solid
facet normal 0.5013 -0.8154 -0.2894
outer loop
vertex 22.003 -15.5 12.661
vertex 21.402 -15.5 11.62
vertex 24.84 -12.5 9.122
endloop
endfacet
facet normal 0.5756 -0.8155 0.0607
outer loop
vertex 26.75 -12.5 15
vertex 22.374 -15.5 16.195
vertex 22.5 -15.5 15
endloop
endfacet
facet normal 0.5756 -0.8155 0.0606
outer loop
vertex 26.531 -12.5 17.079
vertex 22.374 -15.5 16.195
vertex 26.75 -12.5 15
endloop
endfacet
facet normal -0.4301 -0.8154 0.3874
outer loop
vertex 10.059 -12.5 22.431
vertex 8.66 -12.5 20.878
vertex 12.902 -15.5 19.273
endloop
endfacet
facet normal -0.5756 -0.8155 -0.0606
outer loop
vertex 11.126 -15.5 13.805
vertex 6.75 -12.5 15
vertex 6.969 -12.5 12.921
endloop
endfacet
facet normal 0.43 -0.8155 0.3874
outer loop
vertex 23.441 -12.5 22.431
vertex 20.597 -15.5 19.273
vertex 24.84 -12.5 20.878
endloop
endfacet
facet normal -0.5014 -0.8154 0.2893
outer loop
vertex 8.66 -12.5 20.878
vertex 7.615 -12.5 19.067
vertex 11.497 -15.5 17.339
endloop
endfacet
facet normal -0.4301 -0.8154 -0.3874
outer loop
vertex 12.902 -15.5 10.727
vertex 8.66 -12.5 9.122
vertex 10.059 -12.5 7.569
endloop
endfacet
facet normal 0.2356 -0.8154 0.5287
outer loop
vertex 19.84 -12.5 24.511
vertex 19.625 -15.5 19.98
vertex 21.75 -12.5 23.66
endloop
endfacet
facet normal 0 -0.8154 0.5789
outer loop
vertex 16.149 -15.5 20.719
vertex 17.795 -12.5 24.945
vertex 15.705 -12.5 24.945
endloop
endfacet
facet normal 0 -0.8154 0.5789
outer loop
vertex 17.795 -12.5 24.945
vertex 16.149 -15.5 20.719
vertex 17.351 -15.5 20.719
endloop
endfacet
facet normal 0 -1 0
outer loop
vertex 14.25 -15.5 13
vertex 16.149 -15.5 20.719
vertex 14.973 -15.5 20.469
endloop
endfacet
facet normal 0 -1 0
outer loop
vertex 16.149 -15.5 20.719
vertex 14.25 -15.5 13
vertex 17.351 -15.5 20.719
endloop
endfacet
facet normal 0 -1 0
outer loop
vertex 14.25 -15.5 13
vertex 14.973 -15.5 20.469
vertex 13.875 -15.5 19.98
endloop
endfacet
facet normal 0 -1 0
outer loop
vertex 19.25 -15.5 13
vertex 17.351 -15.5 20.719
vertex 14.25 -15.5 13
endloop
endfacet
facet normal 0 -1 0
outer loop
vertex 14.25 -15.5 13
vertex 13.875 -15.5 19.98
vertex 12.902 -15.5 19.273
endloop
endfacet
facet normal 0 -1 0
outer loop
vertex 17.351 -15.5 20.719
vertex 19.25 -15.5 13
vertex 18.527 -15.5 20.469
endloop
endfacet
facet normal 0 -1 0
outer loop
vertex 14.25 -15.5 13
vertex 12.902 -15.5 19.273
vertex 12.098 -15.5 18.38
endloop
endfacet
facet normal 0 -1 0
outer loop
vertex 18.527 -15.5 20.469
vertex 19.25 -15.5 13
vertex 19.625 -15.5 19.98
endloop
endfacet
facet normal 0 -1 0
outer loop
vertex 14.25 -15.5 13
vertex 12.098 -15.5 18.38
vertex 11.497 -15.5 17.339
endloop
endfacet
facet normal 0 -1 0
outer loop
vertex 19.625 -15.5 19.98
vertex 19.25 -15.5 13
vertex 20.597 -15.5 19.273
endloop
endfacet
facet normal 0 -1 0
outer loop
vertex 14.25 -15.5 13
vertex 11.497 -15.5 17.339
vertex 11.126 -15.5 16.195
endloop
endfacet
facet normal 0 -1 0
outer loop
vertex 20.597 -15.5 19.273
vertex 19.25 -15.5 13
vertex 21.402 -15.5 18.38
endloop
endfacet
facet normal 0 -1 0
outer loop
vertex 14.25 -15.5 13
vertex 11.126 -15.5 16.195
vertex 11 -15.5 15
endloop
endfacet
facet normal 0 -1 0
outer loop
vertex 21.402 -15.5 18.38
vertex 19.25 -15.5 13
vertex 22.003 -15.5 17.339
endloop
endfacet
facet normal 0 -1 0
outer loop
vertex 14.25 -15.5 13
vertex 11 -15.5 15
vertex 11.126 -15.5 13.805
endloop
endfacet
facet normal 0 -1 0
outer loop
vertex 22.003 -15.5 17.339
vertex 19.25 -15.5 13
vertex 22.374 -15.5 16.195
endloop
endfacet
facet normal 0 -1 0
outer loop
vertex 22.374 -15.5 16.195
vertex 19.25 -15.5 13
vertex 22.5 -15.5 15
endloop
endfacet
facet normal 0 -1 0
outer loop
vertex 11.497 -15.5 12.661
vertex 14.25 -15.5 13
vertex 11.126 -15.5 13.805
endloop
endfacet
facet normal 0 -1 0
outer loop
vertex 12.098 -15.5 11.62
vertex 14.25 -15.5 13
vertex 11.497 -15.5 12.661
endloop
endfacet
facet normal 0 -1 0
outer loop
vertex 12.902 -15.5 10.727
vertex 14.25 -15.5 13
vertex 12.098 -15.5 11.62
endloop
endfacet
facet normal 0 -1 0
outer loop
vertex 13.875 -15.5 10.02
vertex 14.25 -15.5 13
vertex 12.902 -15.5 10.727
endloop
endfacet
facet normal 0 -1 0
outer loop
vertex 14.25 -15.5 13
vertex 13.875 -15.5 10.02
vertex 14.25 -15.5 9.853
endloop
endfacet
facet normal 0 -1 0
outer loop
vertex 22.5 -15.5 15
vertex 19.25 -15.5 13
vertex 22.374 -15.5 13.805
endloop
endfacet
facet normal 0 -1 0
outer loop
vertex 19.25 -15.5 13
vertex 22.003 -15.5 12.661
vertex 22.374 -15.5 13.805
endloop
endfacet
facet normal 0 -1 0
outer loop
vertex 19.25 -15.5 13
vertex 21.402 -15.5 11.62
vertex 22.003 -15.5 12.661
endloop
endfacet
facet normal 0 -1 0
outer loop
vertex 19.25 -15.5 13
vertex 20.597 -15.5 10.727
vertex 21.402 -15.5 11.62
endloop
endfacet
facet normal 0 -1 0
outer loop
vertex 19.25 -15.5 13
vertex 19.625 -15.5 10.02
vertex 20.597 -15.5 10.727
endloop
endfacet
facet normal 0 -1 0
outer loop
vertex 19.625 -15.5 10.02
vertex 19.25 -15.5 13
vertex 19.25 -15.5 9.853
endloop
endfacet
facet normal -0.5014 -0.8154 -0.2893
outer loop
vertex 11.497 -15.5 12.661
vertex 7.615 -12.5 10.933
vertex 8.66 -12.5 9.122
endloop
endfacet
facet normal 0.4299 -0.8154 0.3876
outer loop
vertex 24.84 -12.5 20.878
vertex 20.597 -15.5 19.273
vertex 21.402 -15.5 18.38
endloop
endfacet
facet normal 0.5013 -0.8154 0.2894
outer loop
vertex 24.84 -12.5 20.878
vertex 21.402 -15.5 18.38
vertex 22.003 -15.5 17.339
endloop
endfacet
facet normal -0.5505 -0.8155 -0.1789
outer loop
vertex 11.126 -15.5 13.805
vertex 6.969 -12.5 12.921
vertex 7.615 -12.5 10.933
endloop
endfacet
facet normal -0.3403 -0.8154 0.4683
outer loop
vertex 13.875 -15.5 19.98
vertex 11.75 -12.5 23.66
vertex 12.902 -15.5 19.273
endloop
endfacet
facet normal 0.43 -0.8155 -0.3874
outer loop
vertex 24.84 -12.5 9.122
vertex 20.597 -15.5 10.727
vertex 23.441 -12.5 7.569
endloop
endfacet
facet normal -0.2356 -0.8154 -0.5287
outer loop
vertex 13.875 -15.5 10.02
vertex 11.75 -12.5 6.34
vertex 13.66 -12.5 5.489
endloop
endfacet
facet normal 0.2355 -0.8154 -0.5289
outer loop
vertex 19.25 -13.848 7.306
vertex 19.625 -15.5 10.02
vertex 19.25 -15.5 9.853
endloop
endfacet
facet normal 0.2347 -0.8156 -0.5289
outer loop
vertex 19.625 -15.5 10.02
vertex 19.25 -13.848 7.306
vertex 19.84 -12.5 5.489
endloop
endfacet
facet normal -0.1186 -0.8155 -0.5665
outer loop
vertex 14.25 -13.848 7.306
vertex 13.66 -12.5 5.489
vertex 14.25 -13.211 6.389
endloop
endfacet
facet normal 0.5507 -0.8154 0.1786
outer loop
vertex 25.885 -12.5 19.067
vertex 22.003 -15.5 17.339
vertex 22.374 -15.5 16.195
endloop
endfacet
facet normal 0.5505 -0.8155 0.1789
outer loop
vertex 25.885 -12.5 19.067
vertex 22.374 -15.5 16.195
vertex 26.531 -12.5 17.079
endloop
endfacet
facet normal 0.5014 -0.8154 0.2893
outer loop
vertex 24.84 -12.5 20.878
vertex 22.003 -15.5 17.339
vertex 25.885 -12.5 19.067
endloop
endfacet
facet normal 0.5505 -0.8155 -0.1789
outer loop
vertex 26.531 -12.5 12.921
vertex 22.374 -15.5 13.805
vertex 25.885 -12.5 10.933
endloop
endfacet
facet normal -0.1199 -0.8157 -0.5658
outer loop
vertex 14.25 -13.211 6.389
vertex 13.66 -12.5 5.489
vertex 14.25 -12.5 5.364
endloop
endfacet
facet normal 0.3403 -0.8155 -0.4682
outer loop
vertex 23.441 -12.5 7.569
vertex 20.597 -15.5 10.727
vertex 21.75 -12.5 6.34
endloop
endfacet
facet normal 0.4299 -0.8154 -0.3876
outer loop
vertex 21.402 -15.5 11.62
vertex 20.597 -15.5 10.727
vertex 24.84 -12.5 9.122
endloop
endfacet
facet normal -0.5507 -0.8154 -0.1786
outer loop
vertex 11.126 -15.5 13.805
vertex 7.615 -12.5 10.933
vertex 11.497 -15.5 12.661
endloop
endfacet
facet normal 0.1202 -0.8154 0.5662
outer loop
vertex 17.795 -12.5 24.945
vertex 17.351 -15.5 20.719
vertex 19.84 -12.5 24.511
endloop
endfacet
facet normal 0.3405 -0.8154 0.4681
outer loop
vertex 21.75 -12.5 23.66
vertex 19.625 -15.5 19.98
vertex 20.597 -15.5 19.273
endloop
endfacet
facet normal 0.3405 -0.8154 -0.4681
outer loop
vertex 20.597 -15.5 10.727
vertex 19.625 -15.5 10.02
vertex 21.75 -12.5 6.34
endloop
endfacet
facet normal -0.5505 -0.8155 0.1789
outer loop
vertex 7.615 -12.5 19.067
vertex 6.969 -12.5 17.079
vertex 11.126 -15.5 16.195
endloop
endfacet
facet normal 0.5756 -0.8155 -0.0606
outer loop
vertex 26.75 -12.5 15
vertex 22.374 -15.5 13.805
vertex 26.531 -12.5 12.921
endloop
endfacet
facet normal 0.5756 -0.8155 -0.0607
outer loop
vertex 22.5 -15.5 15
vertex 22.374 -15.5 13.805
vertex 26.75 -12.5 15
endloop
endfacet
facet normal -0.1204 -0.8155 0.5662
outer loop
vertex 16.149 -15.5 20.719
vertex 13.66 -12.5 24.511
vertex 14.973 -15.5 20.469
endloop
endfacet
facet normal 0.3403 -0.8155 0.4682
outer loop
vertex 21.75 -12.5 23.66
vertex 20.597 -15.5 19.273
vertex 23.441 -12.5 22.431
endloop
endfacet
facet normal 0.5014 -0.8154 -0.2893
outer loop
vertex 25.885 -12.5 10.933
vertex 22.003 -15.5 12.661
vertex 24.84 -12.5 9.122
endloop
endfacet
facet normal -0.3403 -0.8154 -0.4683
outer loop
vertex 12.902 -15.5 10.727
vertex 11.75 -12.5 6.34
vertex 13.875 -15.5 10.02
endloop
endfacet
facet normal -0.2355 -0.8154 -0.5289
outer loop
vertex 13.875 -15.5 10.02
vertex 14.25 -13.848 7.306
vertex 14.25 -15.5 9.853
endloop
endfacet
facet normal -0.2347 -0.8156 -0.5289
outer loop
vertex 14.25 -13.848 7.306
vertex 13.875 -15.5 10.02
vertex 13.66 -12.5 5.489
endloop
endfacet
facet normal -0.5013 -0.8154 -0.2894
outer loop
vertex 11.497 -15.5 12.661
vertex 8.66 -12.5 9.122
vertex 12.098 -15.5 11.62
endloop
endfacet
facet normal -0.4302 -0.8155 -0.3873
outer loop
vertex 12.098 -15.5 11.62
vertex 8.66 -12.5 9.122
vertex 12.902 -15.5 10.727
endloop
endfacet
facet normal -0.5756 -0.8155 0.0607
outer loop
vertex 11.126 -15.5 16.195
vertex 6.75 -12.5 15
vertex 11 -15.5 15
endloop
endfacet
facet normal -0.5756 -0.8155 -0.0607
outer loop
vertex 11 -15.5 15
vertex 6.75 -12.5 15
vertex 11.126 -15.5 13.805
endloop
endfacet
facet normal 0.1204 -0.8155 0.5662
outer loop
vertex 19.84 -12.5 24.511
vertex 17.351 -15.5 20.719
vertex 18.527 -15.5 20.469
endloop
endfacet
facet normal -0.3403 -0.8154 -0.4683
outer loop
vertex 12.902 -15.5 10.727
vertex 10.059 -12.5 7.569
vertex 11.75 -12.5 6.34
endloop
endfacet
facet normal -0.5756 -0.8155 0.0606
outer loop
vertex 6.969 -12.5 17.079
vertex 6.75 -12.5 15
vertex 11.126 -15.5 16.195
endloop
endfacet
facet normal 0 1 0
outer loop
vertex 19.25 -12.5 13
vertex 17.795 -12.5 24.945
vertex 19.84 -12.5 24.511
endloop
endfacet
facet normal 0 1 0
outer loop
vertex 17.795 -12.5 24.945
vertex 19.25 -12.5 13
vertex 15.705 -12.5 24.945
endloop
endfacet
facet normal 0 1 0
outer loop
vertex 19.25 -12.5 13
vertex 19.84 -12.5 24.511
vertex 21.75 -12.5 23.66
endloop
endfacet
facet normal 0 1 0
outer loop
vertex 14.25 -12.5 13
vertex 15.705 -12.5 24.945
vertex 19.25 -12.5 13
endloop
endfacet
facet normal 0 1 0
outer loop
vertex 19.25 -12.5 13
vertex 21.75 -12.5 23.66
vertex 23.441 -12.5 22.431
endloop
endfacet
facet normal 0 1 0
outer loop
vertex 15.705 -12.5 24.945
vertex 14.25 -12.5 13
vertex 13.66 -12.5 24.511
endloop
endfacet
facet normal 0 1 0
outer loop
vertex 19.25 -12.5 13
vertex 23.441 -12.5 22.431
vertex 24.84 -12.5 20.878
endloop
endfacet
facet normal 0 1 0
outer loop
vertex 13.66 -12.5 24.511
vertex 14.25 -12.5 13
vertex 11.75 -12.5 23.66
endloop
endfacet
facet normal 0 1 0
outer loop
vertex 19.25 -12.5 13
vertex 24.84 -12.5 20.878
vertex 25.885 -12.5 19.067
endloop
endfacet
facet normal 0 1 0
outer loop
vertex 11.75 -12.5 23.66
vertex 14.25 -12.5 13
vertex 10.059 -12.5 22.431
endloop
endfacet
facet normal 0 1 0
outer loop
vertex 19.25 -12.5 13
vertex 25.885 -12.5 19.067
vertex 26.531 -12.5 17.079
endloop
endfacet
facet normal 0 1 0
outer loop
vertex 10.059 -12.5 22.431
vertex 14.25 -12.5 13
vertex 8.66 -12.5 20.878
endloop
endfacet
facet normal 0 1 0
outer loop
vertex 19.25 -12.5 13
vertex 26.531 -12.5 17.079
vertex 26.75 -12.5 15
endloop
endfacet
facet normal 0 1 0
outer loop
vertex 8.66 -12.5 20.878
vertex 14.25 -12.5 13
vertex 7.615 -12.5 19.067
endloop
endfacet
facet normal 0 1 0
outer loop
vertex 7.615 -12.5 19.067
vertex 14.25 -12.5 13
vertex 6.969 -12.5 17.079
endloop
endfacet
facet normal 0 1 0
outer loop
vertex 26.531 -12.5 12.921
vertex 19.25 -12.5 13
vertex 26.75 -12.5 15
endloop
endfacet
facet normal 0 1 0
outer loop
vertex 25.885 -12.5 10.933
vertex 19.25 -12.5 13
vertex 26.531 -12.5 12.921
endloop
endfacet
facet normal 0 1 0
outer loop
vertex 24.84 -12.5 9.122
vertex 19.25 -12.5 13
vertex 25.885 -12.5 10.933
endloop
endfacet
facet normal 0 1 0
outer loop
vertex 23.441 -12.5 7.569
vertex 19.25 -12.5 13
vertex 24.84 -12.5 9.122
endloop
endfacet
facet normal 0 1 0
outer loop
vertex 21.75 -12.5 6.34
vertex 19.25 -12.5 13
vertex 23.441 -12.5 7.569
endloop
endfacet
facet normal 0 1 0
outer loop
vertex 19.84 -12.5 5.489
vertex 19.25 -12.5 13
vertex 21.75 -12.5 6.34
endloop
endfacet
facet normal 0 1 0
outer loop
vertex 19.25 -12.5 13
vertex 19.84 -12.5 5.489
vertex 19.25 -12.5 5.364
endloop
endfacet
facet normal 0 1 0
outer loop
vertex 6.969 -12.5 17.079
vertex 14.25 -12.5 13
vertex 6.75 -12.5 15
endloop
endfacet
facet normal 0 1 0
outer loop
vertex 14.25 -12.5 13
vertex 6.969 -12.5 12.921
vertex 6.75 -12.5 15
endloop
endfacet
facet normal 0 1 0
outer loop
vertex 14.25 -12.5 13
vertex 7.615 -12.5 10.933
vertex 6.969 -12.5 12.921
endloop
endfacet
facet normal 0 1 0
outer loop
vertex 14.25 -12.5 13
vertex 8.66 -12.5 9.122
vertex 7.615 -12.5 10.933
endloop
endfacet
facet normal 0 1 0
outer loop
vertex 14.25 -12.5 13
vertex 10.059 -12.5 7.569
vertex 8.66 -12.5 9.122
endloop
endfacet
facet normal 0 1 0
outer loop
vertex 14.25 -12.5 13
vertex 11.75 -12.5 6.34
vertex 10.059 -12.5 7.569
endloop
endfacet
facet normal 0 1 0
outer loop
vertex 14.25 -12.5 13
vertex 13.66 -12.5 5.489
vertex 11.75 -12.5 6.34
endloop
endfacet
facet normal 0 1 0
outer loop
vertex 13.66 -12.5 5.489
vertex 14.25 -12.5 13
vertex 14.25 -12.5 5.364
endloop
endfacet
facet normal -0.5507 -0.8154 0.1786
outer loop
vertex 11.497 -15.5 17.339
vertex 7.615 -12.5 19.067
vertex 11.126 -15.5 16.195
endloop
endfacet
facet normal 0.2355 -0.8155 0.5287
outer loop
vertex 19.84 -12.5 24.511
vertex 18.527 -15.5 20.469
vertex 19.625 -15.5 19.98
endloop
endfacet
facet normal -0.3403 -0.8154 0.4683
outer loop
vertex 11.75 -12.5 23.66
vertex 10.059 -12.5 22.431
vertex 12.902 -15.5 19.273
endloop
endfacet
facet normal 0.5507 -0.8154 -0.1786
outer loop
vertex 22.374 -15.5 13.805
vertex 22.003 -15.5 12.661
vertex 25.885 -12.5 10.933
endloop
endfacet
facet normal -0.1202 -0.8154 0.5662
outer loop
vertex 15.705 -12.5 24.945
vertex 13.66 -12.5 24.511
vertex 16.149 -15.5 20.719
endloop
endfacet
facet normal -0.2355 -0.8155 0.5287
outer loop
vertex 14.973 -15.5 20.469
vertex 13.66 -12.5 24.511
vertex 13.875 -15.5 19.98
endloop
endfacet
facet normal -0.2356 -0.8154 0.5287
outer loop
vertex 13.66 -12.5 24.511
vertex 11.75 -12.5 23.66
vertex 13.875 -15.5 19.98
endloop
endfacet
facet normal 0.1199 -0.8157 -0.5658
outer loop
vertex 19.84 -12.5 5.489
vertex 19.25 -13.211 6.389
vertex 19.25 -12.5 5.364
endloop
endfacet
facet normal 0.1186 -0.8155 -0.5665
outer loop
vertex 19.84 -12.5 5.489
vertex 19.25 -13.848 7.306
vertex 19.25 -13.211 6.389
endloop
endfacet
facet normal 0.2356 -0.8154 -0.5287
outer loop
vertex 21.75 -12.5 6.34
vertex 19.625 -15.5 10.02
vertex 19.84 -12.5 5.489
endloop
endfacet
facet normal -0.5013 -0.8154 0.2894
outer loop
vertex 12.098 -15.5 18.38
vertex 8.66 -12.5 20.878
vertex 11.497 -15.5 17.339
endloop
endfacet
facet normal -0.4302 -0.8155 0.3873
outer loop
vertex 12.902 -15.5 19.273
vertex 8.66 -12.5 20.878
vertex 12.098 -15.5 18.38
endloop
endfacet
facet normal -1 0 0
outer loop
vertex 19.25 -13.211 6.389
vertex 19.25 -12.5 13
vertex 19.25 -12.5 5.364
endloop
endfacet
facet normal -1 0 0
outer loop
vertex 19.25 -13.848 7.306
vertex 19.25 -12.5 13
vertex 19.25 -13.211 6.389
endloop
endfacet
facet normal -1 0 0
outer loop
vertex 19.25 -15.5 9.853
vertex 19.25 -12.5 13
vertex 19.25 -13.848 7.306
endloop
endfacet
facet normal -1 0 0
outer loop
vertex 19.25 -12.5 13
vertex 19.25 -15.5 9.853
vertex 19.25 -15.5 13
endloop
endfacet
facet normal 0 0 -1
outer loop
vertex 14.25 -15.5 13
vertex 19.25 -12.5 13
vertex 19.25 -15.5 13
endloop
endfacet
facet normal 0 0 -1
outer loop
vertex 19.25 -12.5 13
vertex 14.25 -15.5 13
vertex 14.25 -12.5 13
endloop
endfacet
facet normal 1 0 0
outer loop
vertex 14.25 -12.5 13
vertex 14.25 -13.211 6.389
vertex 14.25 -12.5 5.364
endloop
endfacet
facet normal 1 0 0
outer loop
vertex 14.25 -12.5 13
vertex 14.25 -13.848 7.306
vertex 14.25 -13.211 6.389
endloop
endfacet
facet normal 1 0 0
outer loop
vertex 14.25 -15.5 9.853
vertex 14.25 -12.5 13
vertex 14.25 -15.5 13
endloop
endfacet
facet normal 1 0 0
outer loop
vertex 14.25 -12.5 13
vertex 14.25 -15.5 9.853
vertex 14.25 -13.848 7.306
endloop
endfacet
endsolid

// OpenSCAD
module electronics(){
    translate([0,0,1.4]){
        color("green")
            cube([31,70,2]);
            translate([2.3,70-43-2.5,13])
        color("blue")
            cube([18,43,1.5]);
        color("gray"){
            translate([2.3+18/2-8/2,60,14.5]){
                cube([8,10,4]);
            }
        }
    }
}

*electronics();

    t = 2;
    s=.5;

module case(){
        

    union(){
        difference(){
            translate([-(t+s),-(t+s),-t]){
                cube([33.5+2*s+t*2,70+2*s+t*2,24+t*2]);
            }
            translate([-s,-s,0])
            cube([33.5+2*s,70+2*s,24]);
            
            translate([2.3+18/2-11/2-.25,60,1.5+14.5-5/2-.5]){
                cube([11.5,20,10]);
            }
            
            translate([27, 80, 15])
                rotate([90,0,0])
                    cylinder(20,11.5/2,11.5/2);
            
            translate([(33.5+2*s+t*2)/2-(t+s),0,15])
                cube([12.5,20,6],true);
        }
        
        difference(){
            union(){
                translate([-s,-s,0])
                    cube([2,70,5]);
                translate([30-s*2,0,0])
                    cube([5,70,5]);
            }
            electronics();
        }
        
    }
}

intersection(){
    case();
    cube([100,100,100], true);
}

translate([0,20,0])
    difference(){
        case();
        cube([100,100,100], true);
    }

!translate([(33.5+2*s+t*2)/2-(t+s),-t-s-10,15]){
    difference(){
        rotate([90,0,0])
            cylinder(3,10,11.5/2);
        translate([0,0,-12])
            cube([5,10,20],true);
    }
}
    
    
    
    
    
